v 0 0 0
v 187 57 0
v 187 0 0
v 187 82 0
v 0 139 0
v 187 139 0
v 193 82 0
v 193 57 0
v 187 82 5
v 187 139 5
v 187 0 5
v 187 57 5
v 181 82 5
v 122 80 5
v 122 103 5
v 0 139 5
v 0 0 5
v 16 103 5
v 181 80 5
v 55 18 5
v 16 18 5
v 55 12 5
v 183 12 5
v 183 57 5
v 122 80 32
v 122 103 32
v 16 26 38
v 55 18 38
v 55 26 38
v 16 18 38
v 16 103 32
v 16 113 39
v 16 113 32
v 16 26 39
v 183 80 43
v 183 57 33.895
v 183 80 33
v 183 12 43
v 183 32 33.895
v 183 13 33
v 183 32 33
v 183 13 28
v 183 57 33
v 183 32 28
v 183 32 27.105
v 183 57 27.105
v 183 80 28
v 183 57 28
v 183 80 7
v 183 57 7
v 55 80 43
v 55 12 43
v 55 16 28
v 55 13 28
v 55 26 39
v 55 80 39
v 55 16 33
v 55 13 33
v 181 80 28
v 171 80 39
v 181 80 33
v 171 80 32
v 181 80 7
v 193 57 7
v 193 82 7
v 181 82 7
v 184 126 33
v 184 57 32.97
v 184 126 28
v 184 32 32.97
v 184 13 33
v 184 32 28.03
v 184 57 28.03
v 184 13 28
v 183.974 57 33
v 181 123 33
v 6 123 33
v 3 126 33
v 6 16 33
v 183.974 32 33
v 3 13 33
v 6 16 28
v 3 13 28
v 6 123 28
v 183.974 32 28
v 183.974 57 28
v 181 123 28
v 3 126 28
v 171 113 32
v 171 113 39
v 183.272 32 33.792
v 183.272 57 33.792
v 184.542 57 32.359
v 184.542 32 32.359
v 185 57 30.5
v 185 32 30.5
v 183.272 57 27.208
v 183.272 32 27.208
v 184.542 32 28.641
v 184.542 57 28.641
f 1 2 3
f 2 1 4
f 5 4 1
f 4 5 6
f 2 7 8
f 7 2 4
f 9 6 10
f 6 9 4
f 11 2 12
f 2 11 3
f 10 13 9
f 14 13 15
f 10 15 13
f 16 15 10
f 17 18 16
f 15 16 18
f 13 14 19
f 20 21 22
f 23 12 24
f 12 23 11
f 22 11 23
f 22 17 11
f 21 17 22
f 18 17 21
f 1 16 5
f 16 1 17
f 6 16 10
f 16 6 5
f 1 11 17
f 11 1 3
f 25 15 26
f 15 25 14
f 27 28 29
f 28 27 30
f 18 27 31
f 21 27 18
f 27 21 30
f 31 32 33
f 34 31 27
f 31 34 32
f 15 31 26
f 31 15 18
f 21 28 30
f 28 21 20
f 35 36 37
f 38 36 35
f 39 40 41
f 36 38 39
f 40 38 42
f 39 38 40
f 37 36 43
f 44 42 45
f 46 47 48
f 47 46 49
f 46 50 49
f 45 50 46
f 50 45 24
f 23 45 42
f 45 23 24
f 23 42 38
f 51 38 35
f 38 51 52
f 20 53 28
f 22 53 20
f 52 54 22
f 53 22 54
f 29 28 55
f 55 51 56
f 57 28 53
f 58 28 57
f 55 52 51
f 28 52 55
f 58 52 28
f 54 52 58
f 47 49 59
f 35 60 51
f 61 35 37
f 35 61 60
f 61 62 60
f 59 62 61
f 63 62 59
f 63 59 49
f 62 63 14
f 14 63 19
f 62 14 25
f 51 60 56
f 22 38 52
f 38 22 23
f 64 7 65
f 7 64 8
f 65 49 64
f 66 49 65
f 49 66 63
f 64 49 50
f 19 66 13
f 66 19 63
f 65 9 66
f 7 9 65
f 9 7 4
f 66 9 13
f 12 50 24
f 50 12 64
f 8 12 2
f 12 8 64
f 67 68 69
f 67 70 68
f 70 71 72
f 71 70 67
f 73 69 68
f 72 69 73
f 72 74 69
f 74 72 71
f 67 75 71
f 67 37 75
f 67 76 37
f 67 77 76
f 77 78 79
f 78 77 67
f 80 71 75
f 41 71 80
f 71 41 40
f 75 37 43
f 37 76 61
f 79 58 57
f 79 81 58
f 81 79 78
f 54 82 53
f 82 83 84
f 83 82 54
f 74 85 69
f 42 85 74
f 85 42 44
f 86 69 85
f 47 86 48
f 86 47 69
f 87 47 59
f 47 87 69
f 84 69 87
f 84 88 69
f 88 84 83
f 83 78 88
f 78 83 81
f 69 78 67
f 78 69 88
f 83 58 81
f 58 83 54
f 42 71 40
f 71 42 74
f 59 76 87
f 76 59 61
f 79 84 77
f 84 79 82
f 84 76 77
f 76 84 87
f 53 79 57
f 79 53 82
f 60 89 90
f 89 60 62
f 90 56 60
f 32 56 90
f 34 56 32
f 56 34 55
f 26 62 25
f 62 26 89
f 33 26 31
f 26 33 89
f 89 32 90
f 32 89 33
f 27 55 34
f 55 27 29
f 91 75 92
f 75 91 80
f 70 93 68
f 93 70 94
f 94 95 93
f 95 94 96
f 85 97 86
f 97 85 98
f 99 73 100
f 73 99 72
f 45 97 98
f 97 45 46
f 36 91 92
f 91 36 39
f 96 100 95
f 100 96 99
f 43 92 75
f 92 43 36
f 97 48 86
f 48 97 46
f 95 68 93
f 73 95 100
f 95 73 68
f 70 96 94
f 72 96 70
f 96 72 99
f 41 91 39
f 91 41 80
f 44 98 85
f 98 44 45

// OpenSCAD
// Clamshell handheld case (OpenSCAD)
// Flip-open design: back contains Jetson Orin pocket + battery, front is the display cover
// Parameterized; edit top-level variables then render in OpenSCAD

// === Top-level params (tweak as needed) ===
orin_len = 100; orin_wid = 79; orin_height = 21;
screen_active_w = 155; screen_active_h = 87; screen_bezel = 10; screen_thick = 12;
case_wall = 3; hinge_dia = 4; hinge_len = 25;
standoff_dia = 5; standoff_h = 6; screw_hole = 2.5;

board_origin = [16, 18];

case_back_w = max(orin_len + 40, screen_active_w + 2*screen_bezel + 12);
case_back_h = orin_wid + 60;
case_back_thick = case_wall + 2;

battery_len = 120; battery_wid = 60; battery_h = 30;

// standoffs coords (approx)
standoffs = [
    [8,8],
    [8, orin_wid - 8],
    [orin_len - 8, 8],
    [orin_len - 8, orin_wid - 8]
];

// modules
module back_shell() {
    // back outer box
    translate([0,0,0]) cube([case_back_w, case_back_h, case_back_thick]);
    // board pocket
    translate([board_origin[0], board_origin[1], case_back_thick]) cube([orin_len + 2*case_wall, orin_wid + 2*case_wall, orin_height + 12]);
    // battery pocket
    translate([case_back_w - battery_len - 12, 12, case_back_thick]) cube([battery_len + 8, battery_wid + 8, battery_h + 8]);
    // hinge area cutout
    translate([case_back_w - 6, (case_back_h/2) - hinge_len/2, 0]) cube([12, hinge_len, case_back_thick + 2]);
    // standoffs & screw holes
    for(i=[0:len(standoffs)-1]) {
        x = board_origin[0] + standoffs[i][0];
        y = board_origin[1] + standoffs[i][1];
        translate([x,y,case_back_thick]) cylinder(r=standoff_dia/2, h=standoff_h);
        translate([x,y,0]) cylinder(r=screw_hole/2, h=case_back_thick + standoff_h + 1);
    }
}

module front_cover() {
    frame_w = screen_active_w + 2*screen_bezel + 6;
    frame_h = screen_active_h + 2*screen_bezel + 6;
    translate([(case_back_w - frame_w)/2, (case_back_h - frame_h)/2, 0])
        difference() {
            cube([frame_w, frame_h, case_back_thick]);
            translate([3,3,-1]) cube([frame_w - 6, frame_h - 6, case_back_thick + 1]);
        }
    // screen opening (active area)
    translate([(case_back_w - screen_active_w)/2, (case_back_h - screen_active_h)/2, case_back_thick-1])
        cube([screen_active_w, screen_active_h, case_back_thick + 2]);
    // hinge pins
    translate([case_back_w - 6, case_back_h/2 - hinge_len/2, case_back_thick/2]) rotate([90,0,0]) cylinder(r=hinge_dia, h=hinge_len);
}

// assembly
union() {
    translate([0,0,0]) back_shell();
    translate([0,0,case_back_thick + orin_height + 2]) front_cover();
}
